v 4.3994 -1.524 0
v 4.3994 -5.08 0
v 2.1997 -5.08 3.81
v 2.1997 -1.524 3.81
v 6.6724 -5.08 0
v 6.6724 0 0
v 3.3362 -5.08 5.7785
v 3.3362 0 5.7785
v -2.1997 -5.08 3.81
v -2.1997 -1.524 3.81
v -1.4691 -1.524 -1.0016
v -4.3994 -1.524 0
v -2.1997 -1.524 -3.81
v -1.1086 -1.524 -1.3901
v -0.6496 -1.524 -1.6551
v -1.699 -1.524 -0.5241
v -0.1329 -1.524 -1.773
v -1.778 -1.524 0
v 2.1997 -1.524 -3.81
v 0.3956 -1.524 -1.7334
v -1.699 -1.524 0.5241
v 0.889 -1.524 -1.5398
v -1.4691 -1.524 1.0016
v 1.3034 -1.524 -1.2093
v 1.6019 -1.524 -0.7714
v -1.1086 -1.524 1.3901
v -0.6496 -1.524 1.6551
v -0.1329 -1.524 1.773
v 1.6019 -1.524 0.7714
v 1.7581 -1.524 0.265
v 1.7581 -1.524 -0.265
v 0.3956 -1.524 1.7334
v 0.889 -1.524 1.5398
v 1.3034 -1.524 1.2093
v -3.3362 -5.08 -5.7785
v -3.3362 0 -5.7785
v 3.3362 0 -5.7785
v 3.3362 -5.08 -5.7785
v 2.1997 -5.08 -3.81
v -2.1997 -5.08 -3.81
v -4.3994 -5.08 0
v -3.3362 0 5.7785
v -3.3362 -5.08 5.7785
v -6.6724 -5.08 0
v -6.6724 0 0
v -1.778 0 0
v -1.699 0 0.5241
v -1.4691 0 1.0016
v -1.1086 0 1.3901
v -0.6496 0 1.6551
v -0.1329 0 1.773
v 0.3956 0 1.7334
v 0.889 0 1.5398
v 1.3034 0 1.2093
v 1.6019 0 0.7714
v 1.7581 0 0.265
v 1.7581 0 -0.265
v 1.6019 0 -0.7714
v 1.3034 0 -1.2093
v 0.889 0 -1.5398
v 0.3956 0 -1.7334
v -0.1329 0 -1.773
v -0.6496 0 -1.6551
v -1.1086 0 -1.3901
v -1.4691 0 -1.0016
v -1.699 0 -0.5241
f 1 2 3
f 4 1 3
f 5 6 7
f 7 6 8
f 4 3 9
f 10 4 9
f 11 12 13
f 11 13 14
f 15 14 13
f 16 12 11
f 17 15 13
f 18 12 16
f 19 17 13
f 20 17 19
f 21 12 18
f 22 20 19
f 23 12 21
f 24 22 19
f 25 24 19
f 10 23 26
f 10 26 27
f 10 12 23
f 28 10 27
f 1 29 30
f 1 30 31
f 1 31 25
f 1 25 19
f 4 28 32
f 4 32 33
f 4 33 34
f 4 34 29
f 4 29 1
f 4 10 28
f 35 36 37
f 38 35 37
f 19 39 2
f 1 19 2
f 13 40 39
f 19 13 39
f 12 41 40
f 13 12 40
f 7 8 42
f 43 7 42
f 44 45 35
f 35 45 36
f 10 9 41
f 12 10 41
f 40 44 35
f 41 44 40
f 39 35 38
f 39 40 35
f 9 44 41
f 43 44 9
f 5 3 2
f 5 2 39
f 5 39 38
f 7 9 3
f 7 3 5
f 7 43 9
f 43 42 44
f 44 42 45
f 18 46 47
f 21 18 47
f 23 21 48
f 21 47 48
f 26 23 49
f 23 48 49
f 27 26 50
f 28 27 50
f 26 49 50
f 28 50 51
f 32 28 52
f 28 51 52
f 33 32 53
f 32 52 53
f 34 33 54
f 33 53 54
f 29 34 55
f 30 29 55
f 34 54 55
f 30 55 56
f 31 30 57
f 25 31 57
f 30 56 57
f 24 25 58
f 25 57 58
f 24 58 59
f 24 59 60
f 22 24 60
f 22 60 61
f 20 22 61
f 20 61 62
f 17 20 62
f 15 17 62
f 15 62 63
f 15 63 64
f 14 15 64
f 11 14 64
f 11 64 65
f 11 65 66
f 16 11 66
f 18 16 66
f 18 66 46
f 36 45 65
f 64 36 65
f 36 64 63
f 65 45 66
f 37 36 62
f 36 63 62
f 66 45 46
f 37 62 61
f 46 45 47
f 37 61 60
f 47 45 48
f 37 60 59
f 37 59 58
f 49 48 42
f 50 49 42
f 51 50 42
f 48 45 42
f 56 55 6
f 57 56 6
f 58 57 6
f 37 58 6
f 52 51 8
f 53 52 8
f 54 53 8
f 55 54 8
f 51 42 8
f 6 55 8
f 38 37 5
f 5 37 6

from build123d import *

# Parameters (mm, degrees)
F1_DEPTH = 5.08
F3_DEPTH = 3.556
F4_R     = 1.778
F5_DEPTH = 5.081


with BuildPart() as f1:
    # F0 (on Front) → F1 (new body)
    with BuildSketch(Plane.XZ):
        Polygon((3.336219, 5.7785), (-3.336219, 5.7785), (-6.672437, 0), (-3.336219, -5.7785), (3.336219, -5.7785), (6.672437, 0), align=None)
    extrude(amount=F1_DEPTH)

    # F2 (on face) → F3 (cut)
    with BuildSketch(Plane.XZ.offset(5.08)):
        Polygon((-2.199705, -3.81), (2.199705, -3.81), (4.399409, 0), (2.199705, 3.81), (-2.199705, 3.81), (-4.399409, 0), align=None)
    extrude(amount=-F3_DEPTH, mode=Mode.SUBTRACT)

    # F4 (on face) → F5 (cut, through all)
    with BuildSketch(Plane(origin=(0, 0, 0), x_dir=(-1, 0, 0), z_dir=(0, 1, 0))):
        Circle(F4_R)
    extrude(amount=-F5_DEPTH, mode=Mode.SUBTRACT)


solid = f1.part
